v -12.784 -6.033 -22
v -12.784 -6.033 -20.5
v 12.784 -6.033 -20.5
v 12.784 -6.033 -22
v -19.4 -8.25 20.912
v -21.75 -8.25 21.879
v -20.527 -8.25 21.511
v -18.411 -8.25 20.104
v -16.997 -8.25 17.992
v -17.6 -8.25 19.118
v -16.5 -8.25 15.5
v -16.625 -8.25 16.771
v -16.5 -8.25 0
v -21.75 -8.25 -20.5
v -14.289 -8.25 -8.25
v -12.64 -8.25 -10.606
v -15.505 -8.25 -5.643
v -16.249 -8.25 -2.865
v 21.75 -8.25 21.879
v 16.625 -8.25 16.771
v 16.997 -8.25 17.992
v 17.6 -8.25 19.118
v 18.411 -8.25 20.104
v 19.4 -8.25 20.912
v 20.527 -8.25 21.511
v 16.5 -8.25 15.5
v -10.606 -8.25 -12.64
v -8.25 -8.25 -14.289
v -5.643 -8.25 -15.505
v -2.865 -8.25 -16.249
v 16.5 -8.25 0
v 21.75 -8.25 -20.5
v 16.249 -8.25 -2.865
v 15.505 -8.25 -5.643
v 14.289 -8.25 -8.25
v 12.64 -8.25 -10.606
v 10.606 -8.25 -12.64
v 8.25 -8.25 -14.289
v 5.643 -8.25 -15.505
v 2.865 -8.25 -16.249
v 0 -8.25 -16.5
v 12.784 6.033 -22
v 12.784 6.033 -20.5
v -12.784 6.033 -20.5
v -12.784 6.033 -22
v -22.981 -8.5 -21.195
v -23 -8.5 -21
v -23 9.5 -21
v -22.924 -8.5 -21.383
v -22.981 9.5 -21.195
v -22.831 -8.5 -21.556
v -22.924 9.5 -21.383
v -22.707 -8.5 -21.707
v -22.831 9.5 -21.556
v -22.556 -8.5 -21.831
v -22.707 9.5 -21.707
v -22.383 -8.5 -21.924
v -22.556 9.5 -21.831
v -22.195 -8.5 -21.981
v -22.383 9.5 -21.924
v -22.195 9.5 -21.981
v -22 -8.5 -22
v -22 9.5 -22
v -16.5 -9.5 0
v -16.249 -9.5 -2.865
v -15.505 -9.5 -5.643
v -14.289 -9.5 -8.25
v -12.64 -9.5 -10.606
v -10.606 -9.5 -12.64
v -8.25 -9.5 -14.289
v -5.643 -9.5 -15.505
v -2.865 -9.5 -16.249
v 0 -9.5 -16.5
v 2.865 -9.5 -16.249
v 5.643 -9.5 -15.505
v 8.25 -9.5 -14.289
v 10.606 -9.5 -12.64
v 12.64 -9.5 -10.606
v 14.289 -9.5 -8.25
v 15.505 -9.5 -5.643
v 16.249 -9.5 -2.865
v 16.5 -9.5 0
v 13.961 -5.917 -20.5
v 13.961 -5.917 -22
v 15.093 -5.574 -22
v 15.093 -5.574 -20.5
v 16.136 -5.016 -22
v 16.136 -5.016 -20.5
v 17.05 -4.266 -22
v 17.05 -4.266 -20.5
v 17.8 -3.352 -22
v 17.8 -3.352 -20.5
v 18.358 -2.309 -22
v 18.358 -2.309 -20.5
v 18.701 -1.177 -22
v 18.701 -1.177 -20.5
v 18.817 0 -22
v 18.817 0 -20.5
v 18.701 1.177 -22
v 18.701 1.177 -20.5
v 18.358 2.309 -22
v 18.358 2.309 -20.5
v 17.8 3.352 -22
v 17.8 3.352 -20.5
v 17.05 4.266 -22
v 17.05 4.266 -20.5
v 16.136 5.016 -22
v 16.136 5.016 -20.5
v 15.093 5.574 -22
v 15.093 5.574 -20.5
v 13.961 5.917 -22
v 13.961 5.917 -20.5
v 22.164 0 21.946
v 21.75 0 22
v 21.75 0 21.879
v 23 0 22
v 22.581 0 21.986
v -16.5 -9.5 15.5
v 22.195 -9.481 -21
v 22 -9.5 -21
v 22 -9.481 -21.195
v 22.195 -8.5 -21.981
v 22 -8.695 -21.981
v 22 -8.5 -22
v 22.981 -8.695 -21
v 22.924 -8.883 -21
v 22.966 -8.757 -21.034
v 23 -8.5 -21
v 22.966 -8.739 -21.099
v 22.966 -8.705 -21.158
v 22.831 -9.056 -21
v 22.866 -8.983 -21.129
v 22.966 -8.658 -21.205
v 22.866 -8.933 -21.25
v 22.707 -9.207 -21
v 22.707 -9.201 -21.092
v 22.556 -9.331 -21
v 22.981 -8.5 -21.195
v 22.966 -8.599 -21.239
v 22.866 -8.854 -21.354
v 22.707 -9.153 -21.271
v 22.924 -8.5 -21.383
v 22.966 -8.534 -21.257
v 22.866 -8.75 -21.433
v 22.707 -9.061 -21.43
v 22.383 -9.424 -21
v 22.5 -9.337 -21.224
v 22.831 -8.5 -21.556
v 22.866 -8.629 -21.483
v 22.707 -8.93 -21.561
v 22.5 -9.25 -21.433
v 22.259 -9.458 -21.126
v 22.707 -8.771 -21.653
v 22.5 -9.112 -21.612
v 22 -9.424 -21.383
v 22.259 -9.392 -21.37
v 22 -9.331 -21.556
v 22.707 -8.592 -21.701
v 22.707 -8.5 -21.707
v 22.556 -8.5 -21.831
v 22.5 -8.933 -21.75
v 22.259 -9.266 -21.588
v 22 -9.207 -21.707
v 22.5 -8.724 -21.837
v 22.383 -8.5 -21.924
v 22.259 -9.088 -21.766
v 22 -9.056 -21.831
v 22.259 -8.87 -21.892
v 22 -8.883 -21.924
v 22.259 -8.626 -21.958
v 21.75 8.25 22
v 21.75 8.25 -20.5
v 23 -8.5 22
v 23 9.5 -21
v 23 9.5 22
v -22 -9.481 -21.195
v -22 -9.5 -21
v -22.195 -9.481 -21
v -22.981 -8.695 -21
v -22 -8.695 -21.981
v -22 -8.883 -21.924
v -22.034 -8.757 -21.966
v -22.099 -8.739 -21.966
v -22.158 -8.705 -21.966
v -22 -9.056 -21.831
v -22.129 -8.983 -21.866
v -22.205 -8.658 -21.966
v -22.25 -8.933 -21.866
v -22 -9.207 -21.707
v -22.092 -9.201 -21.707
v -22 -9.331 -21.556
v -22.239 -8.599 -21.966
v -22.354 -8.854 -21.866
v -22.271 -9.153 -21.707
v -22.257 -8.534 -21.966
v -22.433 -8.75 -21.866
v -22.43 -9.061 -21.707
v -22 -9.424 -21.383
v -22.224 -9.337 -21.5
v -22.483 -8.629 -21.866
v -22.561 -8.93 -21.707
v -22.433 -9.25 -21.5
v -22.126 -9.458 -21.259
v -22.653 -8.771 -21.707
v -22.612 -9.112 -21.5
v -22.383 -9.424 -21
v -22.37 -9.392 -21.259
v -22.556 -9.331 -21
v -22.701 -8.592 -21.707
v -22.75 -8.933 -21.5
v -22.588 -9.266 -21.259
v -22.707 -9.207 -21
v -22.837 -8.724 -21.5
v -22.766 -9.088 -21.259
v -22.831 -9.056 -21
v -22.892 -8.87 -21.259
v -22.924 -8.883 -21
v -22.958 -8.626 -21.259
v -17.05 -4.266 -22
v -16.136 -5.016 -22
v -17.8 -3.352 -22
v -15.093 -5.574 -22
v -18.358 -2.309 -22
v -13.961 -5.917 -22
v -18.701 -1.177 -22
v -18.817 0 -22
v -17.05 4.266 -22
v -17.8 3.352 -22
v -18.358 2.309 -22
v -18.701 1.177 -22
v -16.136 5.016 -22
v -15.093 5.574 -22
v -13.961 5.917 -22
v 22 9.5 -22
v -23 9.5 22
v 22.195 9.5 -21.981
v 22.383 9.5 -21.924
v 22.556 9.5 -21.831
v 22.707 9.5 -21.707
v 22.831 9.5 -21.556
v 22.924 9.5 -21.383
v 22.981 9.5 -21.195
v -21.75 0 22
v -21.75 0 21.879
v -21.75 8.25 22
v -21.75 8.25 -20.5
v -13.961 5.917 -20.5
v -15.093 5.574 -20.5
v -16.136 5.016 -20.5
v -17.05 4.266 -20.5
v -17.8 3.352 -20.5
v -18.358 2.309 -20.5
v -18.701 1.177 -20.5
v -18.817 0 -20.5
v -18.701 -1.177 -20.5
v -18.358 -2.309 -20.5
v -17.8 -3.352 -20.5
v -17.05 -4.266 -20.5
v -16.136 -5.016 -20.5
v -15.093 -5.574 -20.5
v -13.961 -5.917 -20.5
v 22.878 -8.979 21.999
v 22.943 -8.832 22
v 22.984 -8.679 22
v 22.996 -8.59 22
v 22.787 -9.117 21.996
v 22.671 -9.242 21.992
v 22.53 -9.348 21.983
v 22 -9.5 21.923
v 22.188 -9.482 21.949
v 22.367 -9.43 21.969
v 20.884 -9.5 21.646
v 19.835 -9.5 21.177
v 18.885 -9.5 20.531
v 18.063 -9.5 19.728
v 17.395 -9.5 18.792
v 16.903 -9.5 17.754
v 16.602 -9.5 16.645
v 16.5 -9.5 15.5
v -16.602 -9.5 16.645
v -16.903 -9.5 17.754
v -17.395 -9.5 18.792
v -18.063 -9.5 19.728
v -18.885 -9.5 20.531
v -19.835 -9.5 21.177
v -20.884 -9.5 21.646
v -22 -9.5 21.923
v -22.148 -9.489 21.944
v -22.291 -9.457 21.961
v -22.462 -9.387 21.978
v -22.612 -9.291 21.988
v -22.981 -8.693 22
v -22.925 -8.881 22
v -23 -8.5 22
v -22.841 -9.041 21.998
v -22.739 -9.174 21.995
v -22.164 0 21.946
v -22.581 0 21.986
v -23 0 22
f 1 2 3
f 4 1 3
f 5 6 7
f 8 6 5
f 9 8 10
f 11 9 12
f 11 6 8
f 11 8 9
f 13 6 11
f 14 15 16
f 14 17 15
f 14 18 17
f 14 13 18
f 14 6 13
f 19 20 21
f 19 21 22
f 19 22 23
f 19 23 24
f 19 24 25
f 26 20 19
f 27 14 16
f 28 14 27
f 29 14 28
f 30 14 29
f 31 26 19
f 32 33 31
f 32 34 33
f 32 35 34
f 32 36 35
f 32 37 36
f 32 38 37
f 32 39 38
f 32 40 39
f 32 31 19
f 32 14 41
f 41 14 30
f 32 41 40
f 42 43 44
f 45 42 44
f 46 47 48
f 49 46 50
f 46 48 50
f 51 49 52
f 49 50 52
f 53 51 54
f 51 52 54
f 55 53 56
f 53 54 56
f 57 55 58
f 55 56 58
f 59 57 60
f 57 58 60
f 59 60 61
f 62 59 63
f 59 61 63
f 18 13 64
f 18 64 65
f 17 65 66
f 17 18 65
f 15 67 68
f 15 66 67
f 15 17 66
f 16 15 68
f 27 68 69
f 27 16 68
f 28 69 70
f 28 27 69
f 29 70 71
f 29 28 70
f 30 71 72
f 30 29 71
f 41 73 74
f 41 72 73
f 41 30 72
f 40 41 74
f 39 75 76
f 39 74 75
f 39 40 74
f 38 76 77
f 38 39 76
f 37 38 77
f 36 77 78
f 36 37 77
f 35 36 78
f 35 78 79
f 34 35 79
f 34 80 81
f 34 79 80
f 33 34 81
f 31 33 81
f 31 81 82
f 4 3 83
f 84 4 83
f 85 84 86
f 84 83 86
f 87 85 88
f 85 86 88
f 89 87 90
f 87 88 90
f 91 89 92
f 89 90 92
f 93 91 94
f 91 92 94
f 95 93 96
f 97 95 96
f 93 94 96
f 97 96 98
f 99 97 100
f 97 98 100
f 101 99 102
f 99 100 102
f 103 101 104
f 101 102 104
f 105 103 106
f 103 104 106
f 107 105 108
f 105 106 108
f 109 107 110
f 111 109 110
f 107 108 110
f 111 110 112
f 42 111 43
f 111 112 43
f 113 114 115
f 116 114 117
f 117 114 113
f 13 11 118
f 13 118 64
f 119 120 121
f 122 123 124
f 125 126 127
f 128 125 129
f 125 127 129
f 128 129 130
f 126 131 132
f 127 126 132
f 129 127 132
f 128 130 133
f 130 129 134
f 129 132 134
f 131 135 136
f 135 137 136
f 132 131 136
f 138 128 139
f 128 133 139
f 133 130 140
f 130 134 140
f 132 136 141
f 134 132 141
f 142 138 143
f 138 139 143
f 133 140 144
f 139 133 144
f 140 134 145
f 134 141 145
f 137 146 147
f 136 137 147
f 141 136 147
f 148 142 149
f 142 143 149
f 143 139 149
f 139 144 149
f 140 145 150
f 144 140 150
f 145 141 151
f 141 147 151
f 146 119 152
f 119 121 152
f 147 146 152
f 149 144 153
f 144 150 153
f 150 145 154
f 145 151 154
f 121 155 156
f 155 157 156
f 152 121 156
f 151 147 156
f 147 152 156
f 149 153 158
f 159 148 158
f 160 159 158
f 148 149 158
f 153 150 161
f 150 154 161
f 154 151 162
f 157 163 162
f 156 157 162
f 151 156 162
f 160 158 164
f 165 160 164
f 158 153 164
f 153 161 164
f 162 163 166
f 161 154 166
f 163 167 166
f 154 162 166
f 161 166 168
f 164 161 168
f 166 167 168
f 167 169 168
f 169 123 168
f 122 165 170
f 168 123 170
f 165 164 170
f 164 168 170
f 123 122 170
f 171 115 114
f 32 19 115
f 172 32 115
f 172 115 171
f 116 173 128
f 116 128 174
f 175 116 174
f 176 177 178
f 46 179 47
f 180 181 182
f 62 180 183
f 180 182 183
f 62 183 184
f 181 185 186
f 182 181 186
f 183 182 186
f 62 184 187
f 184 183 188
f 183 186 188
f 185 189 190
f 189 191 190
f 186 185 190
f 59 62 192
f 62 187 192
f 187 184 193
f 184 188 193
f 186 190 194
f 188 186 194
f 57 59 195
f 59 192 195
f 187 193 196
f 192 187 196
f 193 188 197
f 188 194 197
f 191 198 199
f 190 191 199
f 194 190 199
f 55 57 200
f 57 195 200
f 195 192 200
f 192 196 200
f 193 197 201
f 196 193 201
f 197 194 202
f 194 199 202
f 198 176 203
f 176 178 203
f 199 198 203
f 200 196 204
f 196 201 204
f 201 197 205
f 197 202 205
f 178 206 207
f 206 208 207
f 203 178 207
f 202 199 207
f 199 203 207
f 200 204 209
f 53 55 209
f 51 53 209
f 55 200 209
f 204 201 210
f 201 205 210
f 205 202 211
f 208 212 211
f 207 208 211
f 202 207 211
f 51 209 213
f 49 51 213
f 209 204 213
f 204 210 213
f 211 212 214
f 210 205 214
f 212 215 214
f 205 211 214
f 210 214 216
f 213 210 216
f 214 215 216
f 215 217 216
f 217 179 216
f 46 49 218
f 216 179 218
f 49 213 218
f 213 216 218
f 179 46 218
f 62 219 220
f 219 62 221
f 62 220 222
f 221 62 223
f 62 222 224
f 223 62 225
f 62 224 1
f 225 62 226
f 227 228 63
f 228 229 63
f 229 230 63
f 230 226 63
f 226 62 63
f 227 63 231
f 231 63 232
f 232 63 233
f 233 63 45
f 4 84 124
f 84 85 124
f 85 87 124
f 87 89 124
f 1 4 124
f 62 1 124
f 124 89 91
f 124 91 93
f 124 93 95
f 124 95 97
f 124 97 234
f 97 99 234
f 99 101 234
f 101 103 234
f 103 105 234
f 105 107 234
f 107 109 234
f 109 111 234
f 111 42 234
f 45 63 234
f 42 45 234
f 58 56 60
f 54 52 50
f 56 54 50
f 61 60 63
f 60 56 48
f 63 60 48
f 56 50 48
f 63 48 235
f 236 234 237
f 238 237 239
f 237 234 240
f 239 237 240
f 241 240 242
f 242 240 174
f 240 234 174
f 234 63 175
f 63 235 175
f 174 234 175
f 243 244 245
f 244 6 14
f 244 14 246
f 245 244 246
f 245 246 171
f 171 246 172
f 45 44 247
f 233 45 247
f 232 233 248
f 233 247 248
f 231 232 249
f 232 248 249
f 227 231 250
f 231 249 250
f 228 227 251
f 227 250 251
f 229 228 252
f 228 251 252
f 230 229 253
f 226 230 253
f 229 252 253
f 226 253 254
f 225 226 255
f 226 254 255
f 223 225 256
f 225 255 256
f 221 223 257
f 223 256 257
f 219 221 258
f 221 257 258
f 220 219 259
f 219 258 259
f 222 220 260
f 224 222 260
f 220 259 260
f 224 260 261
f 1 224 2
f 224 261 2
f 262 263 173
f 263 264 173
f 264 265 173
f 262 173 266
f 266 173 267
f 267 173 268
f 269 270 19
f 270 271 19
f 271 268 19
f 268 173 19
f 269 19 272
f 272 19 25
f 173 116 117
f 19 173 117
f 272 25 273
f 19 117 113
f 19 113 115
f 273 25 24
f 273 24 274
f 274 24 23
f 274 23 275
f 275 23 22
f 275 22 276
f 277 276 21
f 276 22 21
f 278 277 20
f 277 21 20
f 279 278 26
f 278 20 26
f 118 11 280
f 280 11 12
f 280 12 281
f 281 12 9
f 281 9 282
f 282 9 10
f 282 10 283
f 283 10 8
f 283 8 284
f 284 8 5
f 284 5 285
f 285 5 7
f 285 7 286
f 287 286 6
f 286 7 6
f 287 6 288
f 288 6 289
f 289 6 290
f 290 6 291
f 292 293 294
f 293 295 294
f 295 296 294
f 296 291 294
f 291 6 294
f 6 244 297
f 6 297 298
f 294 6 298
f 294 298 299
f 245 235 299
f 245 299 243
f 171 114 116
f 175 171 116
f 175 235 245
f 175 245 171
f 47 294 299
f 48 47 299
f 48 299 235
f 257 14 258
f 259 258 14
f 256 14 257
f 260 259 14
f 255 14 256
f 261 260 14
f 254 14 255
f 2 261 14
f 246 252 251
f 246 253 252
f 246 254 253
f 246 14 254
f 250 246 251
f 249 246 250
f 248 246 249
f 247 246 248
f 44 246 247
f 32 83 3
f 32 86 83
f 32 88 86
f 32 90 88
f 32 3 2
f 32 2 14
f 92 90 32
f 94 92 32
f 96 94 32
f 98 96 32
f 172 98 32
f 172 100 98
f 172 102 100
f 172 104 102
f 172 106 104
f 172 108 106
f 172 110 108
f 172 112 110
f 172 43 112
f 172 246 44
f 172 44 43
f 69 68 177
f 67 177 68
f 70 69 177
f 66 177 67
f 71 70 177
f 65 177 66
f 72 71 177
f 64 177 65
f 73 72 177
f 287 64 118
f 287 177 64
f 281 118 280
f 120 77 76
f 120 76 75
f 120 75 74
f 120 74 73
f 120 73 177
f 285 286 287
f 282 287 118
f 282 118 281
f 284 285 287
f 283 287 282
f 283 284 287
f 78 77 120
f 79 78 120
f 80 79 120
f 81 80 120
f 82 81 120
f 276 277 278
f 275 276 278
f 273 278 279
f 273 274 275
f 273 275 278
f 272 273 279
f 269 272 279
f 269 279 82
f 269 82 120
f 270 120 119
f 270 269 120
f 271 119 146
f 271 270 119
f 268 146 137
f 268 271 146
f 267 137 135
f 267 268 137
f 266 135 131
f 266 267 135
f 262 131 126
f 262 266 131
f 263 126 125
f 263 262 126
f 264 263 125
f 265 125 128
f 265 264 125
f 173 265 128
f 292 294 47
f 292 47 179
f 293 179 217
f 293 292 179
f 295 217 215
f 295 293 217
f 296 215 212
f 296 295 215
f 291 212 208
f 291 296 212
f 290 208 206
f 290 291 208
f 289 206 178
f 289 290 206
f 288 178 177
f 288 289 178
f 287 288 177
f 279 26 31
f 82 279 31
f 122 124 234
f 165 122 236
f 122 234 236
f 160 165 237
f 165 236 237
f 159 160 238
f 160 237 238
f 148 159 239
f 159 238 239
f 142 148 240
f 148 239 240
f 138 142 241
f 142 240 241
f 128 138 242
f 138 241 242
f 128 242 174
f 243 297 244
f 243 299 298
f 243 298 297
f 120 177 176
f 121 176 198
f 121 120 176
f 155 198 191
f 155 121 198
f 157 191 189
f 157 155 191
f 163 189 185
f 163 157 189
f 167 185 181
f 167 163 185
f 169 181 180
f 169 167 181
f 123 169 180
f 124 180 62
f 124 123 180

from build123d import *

# Parameters (mm, degrees)
SKETCH_W             = 46
SKETCH_H             = 19
PAD_DEPTH            = 22
POCKET_DEPTH         = 9.501
SKETCH002_W          = 43.5
SKETCH002_H          = 16.5
POCKET001_DEPTH      = 20.5
POCKET001_DEPTH_BACK = -24
POCKET002_DEPTH      = 22.001
FILLET_R             = 1


with BuildPart() as part:
    # Sketch → Pad (new body, symmetric)
    with BuildSketch(Plane.XY):
        Rectangle(SKETCH_W, SKETCH_H)
    extrude(amount=PAD_DEPTH, both=True)

    # Sketch001 → Pocket (cut, through all)
    with BuildSketch(Plane.XZ):
        with BuildLine():
            ThreePointArc((-16.5, 0), (0, -16.5), (16.5, 0))
            Line((16.5, 15.5), (16.5, 0))
            ThreePointArc((23, 22), (18.403806, 20.096194), (16.5, 15.5))
            Line((25.719499, 22), (23, 22))
            Line((25.719499, 26.595188), (25.719499, 22))
            Line((-24.273219, 26.595188), (25.719499, 26.595188))
            Line((-24.273219, 22), (-24.273219, 26.595188))
            Line((-23, 22), (-24.273219, 22))
            ThreePointArc((-16.5, 15.5), (-18.403806, 20.096194), (-23, 22))
            Line((-16.5, 15.5), (-16.5, 0))
        make_face()
    extrude(amount=POCKET_DEPTH, mode=Mode.SUBTRACT)

    # Sketch002 → Pocket001 (cut, two sides)
    with BuildSketch(Plane.XY) as pocket001_sk:
        Rectangle(SKETCH002_W, SKETCH002_H)
    extrude(amount=-POCKET001_DEPTH, mode=Mode.SUBTRACT)
    extrude(pocket001_sk.sketch, amount=-POCKET001_DEPTH_BACK, mode=Mode.SUBTRACT)

    # Sketch003 → Pocket002 (cut, through all)
    with BuildSketch(Plane.XY):
        with BuildLine():
            ThreePointArc((-12.783883, 6.033269), (-18.817152, 0), (-12.783883, -6.033269))
            Line((-12.783883, -6.033269), (12.783883, -6.033269))
            ThreePointArc((12.783883, -6.033269), (18.817152, 0), (12.783883, 6.033269))
            Line((12.783883, 6.033269), (-12.783883, 6.033269))
        make_face()
    extrude(amount=-POCKET002_DEPTH, mode=Mode.SUBTRACT)

    # Fillet
    fillet_edges = [part.edges().sort_by_distance(p)[0] for p in [
        (-23, -9.5, 0),
        (0, -9.5, -22),
        (23, -9.5, 0),
        (23, 0, -22),
        (-23, 0, -22),
    ]]
    fillet(fillet_edges, radius=FILLET_R)


solid = part.part
